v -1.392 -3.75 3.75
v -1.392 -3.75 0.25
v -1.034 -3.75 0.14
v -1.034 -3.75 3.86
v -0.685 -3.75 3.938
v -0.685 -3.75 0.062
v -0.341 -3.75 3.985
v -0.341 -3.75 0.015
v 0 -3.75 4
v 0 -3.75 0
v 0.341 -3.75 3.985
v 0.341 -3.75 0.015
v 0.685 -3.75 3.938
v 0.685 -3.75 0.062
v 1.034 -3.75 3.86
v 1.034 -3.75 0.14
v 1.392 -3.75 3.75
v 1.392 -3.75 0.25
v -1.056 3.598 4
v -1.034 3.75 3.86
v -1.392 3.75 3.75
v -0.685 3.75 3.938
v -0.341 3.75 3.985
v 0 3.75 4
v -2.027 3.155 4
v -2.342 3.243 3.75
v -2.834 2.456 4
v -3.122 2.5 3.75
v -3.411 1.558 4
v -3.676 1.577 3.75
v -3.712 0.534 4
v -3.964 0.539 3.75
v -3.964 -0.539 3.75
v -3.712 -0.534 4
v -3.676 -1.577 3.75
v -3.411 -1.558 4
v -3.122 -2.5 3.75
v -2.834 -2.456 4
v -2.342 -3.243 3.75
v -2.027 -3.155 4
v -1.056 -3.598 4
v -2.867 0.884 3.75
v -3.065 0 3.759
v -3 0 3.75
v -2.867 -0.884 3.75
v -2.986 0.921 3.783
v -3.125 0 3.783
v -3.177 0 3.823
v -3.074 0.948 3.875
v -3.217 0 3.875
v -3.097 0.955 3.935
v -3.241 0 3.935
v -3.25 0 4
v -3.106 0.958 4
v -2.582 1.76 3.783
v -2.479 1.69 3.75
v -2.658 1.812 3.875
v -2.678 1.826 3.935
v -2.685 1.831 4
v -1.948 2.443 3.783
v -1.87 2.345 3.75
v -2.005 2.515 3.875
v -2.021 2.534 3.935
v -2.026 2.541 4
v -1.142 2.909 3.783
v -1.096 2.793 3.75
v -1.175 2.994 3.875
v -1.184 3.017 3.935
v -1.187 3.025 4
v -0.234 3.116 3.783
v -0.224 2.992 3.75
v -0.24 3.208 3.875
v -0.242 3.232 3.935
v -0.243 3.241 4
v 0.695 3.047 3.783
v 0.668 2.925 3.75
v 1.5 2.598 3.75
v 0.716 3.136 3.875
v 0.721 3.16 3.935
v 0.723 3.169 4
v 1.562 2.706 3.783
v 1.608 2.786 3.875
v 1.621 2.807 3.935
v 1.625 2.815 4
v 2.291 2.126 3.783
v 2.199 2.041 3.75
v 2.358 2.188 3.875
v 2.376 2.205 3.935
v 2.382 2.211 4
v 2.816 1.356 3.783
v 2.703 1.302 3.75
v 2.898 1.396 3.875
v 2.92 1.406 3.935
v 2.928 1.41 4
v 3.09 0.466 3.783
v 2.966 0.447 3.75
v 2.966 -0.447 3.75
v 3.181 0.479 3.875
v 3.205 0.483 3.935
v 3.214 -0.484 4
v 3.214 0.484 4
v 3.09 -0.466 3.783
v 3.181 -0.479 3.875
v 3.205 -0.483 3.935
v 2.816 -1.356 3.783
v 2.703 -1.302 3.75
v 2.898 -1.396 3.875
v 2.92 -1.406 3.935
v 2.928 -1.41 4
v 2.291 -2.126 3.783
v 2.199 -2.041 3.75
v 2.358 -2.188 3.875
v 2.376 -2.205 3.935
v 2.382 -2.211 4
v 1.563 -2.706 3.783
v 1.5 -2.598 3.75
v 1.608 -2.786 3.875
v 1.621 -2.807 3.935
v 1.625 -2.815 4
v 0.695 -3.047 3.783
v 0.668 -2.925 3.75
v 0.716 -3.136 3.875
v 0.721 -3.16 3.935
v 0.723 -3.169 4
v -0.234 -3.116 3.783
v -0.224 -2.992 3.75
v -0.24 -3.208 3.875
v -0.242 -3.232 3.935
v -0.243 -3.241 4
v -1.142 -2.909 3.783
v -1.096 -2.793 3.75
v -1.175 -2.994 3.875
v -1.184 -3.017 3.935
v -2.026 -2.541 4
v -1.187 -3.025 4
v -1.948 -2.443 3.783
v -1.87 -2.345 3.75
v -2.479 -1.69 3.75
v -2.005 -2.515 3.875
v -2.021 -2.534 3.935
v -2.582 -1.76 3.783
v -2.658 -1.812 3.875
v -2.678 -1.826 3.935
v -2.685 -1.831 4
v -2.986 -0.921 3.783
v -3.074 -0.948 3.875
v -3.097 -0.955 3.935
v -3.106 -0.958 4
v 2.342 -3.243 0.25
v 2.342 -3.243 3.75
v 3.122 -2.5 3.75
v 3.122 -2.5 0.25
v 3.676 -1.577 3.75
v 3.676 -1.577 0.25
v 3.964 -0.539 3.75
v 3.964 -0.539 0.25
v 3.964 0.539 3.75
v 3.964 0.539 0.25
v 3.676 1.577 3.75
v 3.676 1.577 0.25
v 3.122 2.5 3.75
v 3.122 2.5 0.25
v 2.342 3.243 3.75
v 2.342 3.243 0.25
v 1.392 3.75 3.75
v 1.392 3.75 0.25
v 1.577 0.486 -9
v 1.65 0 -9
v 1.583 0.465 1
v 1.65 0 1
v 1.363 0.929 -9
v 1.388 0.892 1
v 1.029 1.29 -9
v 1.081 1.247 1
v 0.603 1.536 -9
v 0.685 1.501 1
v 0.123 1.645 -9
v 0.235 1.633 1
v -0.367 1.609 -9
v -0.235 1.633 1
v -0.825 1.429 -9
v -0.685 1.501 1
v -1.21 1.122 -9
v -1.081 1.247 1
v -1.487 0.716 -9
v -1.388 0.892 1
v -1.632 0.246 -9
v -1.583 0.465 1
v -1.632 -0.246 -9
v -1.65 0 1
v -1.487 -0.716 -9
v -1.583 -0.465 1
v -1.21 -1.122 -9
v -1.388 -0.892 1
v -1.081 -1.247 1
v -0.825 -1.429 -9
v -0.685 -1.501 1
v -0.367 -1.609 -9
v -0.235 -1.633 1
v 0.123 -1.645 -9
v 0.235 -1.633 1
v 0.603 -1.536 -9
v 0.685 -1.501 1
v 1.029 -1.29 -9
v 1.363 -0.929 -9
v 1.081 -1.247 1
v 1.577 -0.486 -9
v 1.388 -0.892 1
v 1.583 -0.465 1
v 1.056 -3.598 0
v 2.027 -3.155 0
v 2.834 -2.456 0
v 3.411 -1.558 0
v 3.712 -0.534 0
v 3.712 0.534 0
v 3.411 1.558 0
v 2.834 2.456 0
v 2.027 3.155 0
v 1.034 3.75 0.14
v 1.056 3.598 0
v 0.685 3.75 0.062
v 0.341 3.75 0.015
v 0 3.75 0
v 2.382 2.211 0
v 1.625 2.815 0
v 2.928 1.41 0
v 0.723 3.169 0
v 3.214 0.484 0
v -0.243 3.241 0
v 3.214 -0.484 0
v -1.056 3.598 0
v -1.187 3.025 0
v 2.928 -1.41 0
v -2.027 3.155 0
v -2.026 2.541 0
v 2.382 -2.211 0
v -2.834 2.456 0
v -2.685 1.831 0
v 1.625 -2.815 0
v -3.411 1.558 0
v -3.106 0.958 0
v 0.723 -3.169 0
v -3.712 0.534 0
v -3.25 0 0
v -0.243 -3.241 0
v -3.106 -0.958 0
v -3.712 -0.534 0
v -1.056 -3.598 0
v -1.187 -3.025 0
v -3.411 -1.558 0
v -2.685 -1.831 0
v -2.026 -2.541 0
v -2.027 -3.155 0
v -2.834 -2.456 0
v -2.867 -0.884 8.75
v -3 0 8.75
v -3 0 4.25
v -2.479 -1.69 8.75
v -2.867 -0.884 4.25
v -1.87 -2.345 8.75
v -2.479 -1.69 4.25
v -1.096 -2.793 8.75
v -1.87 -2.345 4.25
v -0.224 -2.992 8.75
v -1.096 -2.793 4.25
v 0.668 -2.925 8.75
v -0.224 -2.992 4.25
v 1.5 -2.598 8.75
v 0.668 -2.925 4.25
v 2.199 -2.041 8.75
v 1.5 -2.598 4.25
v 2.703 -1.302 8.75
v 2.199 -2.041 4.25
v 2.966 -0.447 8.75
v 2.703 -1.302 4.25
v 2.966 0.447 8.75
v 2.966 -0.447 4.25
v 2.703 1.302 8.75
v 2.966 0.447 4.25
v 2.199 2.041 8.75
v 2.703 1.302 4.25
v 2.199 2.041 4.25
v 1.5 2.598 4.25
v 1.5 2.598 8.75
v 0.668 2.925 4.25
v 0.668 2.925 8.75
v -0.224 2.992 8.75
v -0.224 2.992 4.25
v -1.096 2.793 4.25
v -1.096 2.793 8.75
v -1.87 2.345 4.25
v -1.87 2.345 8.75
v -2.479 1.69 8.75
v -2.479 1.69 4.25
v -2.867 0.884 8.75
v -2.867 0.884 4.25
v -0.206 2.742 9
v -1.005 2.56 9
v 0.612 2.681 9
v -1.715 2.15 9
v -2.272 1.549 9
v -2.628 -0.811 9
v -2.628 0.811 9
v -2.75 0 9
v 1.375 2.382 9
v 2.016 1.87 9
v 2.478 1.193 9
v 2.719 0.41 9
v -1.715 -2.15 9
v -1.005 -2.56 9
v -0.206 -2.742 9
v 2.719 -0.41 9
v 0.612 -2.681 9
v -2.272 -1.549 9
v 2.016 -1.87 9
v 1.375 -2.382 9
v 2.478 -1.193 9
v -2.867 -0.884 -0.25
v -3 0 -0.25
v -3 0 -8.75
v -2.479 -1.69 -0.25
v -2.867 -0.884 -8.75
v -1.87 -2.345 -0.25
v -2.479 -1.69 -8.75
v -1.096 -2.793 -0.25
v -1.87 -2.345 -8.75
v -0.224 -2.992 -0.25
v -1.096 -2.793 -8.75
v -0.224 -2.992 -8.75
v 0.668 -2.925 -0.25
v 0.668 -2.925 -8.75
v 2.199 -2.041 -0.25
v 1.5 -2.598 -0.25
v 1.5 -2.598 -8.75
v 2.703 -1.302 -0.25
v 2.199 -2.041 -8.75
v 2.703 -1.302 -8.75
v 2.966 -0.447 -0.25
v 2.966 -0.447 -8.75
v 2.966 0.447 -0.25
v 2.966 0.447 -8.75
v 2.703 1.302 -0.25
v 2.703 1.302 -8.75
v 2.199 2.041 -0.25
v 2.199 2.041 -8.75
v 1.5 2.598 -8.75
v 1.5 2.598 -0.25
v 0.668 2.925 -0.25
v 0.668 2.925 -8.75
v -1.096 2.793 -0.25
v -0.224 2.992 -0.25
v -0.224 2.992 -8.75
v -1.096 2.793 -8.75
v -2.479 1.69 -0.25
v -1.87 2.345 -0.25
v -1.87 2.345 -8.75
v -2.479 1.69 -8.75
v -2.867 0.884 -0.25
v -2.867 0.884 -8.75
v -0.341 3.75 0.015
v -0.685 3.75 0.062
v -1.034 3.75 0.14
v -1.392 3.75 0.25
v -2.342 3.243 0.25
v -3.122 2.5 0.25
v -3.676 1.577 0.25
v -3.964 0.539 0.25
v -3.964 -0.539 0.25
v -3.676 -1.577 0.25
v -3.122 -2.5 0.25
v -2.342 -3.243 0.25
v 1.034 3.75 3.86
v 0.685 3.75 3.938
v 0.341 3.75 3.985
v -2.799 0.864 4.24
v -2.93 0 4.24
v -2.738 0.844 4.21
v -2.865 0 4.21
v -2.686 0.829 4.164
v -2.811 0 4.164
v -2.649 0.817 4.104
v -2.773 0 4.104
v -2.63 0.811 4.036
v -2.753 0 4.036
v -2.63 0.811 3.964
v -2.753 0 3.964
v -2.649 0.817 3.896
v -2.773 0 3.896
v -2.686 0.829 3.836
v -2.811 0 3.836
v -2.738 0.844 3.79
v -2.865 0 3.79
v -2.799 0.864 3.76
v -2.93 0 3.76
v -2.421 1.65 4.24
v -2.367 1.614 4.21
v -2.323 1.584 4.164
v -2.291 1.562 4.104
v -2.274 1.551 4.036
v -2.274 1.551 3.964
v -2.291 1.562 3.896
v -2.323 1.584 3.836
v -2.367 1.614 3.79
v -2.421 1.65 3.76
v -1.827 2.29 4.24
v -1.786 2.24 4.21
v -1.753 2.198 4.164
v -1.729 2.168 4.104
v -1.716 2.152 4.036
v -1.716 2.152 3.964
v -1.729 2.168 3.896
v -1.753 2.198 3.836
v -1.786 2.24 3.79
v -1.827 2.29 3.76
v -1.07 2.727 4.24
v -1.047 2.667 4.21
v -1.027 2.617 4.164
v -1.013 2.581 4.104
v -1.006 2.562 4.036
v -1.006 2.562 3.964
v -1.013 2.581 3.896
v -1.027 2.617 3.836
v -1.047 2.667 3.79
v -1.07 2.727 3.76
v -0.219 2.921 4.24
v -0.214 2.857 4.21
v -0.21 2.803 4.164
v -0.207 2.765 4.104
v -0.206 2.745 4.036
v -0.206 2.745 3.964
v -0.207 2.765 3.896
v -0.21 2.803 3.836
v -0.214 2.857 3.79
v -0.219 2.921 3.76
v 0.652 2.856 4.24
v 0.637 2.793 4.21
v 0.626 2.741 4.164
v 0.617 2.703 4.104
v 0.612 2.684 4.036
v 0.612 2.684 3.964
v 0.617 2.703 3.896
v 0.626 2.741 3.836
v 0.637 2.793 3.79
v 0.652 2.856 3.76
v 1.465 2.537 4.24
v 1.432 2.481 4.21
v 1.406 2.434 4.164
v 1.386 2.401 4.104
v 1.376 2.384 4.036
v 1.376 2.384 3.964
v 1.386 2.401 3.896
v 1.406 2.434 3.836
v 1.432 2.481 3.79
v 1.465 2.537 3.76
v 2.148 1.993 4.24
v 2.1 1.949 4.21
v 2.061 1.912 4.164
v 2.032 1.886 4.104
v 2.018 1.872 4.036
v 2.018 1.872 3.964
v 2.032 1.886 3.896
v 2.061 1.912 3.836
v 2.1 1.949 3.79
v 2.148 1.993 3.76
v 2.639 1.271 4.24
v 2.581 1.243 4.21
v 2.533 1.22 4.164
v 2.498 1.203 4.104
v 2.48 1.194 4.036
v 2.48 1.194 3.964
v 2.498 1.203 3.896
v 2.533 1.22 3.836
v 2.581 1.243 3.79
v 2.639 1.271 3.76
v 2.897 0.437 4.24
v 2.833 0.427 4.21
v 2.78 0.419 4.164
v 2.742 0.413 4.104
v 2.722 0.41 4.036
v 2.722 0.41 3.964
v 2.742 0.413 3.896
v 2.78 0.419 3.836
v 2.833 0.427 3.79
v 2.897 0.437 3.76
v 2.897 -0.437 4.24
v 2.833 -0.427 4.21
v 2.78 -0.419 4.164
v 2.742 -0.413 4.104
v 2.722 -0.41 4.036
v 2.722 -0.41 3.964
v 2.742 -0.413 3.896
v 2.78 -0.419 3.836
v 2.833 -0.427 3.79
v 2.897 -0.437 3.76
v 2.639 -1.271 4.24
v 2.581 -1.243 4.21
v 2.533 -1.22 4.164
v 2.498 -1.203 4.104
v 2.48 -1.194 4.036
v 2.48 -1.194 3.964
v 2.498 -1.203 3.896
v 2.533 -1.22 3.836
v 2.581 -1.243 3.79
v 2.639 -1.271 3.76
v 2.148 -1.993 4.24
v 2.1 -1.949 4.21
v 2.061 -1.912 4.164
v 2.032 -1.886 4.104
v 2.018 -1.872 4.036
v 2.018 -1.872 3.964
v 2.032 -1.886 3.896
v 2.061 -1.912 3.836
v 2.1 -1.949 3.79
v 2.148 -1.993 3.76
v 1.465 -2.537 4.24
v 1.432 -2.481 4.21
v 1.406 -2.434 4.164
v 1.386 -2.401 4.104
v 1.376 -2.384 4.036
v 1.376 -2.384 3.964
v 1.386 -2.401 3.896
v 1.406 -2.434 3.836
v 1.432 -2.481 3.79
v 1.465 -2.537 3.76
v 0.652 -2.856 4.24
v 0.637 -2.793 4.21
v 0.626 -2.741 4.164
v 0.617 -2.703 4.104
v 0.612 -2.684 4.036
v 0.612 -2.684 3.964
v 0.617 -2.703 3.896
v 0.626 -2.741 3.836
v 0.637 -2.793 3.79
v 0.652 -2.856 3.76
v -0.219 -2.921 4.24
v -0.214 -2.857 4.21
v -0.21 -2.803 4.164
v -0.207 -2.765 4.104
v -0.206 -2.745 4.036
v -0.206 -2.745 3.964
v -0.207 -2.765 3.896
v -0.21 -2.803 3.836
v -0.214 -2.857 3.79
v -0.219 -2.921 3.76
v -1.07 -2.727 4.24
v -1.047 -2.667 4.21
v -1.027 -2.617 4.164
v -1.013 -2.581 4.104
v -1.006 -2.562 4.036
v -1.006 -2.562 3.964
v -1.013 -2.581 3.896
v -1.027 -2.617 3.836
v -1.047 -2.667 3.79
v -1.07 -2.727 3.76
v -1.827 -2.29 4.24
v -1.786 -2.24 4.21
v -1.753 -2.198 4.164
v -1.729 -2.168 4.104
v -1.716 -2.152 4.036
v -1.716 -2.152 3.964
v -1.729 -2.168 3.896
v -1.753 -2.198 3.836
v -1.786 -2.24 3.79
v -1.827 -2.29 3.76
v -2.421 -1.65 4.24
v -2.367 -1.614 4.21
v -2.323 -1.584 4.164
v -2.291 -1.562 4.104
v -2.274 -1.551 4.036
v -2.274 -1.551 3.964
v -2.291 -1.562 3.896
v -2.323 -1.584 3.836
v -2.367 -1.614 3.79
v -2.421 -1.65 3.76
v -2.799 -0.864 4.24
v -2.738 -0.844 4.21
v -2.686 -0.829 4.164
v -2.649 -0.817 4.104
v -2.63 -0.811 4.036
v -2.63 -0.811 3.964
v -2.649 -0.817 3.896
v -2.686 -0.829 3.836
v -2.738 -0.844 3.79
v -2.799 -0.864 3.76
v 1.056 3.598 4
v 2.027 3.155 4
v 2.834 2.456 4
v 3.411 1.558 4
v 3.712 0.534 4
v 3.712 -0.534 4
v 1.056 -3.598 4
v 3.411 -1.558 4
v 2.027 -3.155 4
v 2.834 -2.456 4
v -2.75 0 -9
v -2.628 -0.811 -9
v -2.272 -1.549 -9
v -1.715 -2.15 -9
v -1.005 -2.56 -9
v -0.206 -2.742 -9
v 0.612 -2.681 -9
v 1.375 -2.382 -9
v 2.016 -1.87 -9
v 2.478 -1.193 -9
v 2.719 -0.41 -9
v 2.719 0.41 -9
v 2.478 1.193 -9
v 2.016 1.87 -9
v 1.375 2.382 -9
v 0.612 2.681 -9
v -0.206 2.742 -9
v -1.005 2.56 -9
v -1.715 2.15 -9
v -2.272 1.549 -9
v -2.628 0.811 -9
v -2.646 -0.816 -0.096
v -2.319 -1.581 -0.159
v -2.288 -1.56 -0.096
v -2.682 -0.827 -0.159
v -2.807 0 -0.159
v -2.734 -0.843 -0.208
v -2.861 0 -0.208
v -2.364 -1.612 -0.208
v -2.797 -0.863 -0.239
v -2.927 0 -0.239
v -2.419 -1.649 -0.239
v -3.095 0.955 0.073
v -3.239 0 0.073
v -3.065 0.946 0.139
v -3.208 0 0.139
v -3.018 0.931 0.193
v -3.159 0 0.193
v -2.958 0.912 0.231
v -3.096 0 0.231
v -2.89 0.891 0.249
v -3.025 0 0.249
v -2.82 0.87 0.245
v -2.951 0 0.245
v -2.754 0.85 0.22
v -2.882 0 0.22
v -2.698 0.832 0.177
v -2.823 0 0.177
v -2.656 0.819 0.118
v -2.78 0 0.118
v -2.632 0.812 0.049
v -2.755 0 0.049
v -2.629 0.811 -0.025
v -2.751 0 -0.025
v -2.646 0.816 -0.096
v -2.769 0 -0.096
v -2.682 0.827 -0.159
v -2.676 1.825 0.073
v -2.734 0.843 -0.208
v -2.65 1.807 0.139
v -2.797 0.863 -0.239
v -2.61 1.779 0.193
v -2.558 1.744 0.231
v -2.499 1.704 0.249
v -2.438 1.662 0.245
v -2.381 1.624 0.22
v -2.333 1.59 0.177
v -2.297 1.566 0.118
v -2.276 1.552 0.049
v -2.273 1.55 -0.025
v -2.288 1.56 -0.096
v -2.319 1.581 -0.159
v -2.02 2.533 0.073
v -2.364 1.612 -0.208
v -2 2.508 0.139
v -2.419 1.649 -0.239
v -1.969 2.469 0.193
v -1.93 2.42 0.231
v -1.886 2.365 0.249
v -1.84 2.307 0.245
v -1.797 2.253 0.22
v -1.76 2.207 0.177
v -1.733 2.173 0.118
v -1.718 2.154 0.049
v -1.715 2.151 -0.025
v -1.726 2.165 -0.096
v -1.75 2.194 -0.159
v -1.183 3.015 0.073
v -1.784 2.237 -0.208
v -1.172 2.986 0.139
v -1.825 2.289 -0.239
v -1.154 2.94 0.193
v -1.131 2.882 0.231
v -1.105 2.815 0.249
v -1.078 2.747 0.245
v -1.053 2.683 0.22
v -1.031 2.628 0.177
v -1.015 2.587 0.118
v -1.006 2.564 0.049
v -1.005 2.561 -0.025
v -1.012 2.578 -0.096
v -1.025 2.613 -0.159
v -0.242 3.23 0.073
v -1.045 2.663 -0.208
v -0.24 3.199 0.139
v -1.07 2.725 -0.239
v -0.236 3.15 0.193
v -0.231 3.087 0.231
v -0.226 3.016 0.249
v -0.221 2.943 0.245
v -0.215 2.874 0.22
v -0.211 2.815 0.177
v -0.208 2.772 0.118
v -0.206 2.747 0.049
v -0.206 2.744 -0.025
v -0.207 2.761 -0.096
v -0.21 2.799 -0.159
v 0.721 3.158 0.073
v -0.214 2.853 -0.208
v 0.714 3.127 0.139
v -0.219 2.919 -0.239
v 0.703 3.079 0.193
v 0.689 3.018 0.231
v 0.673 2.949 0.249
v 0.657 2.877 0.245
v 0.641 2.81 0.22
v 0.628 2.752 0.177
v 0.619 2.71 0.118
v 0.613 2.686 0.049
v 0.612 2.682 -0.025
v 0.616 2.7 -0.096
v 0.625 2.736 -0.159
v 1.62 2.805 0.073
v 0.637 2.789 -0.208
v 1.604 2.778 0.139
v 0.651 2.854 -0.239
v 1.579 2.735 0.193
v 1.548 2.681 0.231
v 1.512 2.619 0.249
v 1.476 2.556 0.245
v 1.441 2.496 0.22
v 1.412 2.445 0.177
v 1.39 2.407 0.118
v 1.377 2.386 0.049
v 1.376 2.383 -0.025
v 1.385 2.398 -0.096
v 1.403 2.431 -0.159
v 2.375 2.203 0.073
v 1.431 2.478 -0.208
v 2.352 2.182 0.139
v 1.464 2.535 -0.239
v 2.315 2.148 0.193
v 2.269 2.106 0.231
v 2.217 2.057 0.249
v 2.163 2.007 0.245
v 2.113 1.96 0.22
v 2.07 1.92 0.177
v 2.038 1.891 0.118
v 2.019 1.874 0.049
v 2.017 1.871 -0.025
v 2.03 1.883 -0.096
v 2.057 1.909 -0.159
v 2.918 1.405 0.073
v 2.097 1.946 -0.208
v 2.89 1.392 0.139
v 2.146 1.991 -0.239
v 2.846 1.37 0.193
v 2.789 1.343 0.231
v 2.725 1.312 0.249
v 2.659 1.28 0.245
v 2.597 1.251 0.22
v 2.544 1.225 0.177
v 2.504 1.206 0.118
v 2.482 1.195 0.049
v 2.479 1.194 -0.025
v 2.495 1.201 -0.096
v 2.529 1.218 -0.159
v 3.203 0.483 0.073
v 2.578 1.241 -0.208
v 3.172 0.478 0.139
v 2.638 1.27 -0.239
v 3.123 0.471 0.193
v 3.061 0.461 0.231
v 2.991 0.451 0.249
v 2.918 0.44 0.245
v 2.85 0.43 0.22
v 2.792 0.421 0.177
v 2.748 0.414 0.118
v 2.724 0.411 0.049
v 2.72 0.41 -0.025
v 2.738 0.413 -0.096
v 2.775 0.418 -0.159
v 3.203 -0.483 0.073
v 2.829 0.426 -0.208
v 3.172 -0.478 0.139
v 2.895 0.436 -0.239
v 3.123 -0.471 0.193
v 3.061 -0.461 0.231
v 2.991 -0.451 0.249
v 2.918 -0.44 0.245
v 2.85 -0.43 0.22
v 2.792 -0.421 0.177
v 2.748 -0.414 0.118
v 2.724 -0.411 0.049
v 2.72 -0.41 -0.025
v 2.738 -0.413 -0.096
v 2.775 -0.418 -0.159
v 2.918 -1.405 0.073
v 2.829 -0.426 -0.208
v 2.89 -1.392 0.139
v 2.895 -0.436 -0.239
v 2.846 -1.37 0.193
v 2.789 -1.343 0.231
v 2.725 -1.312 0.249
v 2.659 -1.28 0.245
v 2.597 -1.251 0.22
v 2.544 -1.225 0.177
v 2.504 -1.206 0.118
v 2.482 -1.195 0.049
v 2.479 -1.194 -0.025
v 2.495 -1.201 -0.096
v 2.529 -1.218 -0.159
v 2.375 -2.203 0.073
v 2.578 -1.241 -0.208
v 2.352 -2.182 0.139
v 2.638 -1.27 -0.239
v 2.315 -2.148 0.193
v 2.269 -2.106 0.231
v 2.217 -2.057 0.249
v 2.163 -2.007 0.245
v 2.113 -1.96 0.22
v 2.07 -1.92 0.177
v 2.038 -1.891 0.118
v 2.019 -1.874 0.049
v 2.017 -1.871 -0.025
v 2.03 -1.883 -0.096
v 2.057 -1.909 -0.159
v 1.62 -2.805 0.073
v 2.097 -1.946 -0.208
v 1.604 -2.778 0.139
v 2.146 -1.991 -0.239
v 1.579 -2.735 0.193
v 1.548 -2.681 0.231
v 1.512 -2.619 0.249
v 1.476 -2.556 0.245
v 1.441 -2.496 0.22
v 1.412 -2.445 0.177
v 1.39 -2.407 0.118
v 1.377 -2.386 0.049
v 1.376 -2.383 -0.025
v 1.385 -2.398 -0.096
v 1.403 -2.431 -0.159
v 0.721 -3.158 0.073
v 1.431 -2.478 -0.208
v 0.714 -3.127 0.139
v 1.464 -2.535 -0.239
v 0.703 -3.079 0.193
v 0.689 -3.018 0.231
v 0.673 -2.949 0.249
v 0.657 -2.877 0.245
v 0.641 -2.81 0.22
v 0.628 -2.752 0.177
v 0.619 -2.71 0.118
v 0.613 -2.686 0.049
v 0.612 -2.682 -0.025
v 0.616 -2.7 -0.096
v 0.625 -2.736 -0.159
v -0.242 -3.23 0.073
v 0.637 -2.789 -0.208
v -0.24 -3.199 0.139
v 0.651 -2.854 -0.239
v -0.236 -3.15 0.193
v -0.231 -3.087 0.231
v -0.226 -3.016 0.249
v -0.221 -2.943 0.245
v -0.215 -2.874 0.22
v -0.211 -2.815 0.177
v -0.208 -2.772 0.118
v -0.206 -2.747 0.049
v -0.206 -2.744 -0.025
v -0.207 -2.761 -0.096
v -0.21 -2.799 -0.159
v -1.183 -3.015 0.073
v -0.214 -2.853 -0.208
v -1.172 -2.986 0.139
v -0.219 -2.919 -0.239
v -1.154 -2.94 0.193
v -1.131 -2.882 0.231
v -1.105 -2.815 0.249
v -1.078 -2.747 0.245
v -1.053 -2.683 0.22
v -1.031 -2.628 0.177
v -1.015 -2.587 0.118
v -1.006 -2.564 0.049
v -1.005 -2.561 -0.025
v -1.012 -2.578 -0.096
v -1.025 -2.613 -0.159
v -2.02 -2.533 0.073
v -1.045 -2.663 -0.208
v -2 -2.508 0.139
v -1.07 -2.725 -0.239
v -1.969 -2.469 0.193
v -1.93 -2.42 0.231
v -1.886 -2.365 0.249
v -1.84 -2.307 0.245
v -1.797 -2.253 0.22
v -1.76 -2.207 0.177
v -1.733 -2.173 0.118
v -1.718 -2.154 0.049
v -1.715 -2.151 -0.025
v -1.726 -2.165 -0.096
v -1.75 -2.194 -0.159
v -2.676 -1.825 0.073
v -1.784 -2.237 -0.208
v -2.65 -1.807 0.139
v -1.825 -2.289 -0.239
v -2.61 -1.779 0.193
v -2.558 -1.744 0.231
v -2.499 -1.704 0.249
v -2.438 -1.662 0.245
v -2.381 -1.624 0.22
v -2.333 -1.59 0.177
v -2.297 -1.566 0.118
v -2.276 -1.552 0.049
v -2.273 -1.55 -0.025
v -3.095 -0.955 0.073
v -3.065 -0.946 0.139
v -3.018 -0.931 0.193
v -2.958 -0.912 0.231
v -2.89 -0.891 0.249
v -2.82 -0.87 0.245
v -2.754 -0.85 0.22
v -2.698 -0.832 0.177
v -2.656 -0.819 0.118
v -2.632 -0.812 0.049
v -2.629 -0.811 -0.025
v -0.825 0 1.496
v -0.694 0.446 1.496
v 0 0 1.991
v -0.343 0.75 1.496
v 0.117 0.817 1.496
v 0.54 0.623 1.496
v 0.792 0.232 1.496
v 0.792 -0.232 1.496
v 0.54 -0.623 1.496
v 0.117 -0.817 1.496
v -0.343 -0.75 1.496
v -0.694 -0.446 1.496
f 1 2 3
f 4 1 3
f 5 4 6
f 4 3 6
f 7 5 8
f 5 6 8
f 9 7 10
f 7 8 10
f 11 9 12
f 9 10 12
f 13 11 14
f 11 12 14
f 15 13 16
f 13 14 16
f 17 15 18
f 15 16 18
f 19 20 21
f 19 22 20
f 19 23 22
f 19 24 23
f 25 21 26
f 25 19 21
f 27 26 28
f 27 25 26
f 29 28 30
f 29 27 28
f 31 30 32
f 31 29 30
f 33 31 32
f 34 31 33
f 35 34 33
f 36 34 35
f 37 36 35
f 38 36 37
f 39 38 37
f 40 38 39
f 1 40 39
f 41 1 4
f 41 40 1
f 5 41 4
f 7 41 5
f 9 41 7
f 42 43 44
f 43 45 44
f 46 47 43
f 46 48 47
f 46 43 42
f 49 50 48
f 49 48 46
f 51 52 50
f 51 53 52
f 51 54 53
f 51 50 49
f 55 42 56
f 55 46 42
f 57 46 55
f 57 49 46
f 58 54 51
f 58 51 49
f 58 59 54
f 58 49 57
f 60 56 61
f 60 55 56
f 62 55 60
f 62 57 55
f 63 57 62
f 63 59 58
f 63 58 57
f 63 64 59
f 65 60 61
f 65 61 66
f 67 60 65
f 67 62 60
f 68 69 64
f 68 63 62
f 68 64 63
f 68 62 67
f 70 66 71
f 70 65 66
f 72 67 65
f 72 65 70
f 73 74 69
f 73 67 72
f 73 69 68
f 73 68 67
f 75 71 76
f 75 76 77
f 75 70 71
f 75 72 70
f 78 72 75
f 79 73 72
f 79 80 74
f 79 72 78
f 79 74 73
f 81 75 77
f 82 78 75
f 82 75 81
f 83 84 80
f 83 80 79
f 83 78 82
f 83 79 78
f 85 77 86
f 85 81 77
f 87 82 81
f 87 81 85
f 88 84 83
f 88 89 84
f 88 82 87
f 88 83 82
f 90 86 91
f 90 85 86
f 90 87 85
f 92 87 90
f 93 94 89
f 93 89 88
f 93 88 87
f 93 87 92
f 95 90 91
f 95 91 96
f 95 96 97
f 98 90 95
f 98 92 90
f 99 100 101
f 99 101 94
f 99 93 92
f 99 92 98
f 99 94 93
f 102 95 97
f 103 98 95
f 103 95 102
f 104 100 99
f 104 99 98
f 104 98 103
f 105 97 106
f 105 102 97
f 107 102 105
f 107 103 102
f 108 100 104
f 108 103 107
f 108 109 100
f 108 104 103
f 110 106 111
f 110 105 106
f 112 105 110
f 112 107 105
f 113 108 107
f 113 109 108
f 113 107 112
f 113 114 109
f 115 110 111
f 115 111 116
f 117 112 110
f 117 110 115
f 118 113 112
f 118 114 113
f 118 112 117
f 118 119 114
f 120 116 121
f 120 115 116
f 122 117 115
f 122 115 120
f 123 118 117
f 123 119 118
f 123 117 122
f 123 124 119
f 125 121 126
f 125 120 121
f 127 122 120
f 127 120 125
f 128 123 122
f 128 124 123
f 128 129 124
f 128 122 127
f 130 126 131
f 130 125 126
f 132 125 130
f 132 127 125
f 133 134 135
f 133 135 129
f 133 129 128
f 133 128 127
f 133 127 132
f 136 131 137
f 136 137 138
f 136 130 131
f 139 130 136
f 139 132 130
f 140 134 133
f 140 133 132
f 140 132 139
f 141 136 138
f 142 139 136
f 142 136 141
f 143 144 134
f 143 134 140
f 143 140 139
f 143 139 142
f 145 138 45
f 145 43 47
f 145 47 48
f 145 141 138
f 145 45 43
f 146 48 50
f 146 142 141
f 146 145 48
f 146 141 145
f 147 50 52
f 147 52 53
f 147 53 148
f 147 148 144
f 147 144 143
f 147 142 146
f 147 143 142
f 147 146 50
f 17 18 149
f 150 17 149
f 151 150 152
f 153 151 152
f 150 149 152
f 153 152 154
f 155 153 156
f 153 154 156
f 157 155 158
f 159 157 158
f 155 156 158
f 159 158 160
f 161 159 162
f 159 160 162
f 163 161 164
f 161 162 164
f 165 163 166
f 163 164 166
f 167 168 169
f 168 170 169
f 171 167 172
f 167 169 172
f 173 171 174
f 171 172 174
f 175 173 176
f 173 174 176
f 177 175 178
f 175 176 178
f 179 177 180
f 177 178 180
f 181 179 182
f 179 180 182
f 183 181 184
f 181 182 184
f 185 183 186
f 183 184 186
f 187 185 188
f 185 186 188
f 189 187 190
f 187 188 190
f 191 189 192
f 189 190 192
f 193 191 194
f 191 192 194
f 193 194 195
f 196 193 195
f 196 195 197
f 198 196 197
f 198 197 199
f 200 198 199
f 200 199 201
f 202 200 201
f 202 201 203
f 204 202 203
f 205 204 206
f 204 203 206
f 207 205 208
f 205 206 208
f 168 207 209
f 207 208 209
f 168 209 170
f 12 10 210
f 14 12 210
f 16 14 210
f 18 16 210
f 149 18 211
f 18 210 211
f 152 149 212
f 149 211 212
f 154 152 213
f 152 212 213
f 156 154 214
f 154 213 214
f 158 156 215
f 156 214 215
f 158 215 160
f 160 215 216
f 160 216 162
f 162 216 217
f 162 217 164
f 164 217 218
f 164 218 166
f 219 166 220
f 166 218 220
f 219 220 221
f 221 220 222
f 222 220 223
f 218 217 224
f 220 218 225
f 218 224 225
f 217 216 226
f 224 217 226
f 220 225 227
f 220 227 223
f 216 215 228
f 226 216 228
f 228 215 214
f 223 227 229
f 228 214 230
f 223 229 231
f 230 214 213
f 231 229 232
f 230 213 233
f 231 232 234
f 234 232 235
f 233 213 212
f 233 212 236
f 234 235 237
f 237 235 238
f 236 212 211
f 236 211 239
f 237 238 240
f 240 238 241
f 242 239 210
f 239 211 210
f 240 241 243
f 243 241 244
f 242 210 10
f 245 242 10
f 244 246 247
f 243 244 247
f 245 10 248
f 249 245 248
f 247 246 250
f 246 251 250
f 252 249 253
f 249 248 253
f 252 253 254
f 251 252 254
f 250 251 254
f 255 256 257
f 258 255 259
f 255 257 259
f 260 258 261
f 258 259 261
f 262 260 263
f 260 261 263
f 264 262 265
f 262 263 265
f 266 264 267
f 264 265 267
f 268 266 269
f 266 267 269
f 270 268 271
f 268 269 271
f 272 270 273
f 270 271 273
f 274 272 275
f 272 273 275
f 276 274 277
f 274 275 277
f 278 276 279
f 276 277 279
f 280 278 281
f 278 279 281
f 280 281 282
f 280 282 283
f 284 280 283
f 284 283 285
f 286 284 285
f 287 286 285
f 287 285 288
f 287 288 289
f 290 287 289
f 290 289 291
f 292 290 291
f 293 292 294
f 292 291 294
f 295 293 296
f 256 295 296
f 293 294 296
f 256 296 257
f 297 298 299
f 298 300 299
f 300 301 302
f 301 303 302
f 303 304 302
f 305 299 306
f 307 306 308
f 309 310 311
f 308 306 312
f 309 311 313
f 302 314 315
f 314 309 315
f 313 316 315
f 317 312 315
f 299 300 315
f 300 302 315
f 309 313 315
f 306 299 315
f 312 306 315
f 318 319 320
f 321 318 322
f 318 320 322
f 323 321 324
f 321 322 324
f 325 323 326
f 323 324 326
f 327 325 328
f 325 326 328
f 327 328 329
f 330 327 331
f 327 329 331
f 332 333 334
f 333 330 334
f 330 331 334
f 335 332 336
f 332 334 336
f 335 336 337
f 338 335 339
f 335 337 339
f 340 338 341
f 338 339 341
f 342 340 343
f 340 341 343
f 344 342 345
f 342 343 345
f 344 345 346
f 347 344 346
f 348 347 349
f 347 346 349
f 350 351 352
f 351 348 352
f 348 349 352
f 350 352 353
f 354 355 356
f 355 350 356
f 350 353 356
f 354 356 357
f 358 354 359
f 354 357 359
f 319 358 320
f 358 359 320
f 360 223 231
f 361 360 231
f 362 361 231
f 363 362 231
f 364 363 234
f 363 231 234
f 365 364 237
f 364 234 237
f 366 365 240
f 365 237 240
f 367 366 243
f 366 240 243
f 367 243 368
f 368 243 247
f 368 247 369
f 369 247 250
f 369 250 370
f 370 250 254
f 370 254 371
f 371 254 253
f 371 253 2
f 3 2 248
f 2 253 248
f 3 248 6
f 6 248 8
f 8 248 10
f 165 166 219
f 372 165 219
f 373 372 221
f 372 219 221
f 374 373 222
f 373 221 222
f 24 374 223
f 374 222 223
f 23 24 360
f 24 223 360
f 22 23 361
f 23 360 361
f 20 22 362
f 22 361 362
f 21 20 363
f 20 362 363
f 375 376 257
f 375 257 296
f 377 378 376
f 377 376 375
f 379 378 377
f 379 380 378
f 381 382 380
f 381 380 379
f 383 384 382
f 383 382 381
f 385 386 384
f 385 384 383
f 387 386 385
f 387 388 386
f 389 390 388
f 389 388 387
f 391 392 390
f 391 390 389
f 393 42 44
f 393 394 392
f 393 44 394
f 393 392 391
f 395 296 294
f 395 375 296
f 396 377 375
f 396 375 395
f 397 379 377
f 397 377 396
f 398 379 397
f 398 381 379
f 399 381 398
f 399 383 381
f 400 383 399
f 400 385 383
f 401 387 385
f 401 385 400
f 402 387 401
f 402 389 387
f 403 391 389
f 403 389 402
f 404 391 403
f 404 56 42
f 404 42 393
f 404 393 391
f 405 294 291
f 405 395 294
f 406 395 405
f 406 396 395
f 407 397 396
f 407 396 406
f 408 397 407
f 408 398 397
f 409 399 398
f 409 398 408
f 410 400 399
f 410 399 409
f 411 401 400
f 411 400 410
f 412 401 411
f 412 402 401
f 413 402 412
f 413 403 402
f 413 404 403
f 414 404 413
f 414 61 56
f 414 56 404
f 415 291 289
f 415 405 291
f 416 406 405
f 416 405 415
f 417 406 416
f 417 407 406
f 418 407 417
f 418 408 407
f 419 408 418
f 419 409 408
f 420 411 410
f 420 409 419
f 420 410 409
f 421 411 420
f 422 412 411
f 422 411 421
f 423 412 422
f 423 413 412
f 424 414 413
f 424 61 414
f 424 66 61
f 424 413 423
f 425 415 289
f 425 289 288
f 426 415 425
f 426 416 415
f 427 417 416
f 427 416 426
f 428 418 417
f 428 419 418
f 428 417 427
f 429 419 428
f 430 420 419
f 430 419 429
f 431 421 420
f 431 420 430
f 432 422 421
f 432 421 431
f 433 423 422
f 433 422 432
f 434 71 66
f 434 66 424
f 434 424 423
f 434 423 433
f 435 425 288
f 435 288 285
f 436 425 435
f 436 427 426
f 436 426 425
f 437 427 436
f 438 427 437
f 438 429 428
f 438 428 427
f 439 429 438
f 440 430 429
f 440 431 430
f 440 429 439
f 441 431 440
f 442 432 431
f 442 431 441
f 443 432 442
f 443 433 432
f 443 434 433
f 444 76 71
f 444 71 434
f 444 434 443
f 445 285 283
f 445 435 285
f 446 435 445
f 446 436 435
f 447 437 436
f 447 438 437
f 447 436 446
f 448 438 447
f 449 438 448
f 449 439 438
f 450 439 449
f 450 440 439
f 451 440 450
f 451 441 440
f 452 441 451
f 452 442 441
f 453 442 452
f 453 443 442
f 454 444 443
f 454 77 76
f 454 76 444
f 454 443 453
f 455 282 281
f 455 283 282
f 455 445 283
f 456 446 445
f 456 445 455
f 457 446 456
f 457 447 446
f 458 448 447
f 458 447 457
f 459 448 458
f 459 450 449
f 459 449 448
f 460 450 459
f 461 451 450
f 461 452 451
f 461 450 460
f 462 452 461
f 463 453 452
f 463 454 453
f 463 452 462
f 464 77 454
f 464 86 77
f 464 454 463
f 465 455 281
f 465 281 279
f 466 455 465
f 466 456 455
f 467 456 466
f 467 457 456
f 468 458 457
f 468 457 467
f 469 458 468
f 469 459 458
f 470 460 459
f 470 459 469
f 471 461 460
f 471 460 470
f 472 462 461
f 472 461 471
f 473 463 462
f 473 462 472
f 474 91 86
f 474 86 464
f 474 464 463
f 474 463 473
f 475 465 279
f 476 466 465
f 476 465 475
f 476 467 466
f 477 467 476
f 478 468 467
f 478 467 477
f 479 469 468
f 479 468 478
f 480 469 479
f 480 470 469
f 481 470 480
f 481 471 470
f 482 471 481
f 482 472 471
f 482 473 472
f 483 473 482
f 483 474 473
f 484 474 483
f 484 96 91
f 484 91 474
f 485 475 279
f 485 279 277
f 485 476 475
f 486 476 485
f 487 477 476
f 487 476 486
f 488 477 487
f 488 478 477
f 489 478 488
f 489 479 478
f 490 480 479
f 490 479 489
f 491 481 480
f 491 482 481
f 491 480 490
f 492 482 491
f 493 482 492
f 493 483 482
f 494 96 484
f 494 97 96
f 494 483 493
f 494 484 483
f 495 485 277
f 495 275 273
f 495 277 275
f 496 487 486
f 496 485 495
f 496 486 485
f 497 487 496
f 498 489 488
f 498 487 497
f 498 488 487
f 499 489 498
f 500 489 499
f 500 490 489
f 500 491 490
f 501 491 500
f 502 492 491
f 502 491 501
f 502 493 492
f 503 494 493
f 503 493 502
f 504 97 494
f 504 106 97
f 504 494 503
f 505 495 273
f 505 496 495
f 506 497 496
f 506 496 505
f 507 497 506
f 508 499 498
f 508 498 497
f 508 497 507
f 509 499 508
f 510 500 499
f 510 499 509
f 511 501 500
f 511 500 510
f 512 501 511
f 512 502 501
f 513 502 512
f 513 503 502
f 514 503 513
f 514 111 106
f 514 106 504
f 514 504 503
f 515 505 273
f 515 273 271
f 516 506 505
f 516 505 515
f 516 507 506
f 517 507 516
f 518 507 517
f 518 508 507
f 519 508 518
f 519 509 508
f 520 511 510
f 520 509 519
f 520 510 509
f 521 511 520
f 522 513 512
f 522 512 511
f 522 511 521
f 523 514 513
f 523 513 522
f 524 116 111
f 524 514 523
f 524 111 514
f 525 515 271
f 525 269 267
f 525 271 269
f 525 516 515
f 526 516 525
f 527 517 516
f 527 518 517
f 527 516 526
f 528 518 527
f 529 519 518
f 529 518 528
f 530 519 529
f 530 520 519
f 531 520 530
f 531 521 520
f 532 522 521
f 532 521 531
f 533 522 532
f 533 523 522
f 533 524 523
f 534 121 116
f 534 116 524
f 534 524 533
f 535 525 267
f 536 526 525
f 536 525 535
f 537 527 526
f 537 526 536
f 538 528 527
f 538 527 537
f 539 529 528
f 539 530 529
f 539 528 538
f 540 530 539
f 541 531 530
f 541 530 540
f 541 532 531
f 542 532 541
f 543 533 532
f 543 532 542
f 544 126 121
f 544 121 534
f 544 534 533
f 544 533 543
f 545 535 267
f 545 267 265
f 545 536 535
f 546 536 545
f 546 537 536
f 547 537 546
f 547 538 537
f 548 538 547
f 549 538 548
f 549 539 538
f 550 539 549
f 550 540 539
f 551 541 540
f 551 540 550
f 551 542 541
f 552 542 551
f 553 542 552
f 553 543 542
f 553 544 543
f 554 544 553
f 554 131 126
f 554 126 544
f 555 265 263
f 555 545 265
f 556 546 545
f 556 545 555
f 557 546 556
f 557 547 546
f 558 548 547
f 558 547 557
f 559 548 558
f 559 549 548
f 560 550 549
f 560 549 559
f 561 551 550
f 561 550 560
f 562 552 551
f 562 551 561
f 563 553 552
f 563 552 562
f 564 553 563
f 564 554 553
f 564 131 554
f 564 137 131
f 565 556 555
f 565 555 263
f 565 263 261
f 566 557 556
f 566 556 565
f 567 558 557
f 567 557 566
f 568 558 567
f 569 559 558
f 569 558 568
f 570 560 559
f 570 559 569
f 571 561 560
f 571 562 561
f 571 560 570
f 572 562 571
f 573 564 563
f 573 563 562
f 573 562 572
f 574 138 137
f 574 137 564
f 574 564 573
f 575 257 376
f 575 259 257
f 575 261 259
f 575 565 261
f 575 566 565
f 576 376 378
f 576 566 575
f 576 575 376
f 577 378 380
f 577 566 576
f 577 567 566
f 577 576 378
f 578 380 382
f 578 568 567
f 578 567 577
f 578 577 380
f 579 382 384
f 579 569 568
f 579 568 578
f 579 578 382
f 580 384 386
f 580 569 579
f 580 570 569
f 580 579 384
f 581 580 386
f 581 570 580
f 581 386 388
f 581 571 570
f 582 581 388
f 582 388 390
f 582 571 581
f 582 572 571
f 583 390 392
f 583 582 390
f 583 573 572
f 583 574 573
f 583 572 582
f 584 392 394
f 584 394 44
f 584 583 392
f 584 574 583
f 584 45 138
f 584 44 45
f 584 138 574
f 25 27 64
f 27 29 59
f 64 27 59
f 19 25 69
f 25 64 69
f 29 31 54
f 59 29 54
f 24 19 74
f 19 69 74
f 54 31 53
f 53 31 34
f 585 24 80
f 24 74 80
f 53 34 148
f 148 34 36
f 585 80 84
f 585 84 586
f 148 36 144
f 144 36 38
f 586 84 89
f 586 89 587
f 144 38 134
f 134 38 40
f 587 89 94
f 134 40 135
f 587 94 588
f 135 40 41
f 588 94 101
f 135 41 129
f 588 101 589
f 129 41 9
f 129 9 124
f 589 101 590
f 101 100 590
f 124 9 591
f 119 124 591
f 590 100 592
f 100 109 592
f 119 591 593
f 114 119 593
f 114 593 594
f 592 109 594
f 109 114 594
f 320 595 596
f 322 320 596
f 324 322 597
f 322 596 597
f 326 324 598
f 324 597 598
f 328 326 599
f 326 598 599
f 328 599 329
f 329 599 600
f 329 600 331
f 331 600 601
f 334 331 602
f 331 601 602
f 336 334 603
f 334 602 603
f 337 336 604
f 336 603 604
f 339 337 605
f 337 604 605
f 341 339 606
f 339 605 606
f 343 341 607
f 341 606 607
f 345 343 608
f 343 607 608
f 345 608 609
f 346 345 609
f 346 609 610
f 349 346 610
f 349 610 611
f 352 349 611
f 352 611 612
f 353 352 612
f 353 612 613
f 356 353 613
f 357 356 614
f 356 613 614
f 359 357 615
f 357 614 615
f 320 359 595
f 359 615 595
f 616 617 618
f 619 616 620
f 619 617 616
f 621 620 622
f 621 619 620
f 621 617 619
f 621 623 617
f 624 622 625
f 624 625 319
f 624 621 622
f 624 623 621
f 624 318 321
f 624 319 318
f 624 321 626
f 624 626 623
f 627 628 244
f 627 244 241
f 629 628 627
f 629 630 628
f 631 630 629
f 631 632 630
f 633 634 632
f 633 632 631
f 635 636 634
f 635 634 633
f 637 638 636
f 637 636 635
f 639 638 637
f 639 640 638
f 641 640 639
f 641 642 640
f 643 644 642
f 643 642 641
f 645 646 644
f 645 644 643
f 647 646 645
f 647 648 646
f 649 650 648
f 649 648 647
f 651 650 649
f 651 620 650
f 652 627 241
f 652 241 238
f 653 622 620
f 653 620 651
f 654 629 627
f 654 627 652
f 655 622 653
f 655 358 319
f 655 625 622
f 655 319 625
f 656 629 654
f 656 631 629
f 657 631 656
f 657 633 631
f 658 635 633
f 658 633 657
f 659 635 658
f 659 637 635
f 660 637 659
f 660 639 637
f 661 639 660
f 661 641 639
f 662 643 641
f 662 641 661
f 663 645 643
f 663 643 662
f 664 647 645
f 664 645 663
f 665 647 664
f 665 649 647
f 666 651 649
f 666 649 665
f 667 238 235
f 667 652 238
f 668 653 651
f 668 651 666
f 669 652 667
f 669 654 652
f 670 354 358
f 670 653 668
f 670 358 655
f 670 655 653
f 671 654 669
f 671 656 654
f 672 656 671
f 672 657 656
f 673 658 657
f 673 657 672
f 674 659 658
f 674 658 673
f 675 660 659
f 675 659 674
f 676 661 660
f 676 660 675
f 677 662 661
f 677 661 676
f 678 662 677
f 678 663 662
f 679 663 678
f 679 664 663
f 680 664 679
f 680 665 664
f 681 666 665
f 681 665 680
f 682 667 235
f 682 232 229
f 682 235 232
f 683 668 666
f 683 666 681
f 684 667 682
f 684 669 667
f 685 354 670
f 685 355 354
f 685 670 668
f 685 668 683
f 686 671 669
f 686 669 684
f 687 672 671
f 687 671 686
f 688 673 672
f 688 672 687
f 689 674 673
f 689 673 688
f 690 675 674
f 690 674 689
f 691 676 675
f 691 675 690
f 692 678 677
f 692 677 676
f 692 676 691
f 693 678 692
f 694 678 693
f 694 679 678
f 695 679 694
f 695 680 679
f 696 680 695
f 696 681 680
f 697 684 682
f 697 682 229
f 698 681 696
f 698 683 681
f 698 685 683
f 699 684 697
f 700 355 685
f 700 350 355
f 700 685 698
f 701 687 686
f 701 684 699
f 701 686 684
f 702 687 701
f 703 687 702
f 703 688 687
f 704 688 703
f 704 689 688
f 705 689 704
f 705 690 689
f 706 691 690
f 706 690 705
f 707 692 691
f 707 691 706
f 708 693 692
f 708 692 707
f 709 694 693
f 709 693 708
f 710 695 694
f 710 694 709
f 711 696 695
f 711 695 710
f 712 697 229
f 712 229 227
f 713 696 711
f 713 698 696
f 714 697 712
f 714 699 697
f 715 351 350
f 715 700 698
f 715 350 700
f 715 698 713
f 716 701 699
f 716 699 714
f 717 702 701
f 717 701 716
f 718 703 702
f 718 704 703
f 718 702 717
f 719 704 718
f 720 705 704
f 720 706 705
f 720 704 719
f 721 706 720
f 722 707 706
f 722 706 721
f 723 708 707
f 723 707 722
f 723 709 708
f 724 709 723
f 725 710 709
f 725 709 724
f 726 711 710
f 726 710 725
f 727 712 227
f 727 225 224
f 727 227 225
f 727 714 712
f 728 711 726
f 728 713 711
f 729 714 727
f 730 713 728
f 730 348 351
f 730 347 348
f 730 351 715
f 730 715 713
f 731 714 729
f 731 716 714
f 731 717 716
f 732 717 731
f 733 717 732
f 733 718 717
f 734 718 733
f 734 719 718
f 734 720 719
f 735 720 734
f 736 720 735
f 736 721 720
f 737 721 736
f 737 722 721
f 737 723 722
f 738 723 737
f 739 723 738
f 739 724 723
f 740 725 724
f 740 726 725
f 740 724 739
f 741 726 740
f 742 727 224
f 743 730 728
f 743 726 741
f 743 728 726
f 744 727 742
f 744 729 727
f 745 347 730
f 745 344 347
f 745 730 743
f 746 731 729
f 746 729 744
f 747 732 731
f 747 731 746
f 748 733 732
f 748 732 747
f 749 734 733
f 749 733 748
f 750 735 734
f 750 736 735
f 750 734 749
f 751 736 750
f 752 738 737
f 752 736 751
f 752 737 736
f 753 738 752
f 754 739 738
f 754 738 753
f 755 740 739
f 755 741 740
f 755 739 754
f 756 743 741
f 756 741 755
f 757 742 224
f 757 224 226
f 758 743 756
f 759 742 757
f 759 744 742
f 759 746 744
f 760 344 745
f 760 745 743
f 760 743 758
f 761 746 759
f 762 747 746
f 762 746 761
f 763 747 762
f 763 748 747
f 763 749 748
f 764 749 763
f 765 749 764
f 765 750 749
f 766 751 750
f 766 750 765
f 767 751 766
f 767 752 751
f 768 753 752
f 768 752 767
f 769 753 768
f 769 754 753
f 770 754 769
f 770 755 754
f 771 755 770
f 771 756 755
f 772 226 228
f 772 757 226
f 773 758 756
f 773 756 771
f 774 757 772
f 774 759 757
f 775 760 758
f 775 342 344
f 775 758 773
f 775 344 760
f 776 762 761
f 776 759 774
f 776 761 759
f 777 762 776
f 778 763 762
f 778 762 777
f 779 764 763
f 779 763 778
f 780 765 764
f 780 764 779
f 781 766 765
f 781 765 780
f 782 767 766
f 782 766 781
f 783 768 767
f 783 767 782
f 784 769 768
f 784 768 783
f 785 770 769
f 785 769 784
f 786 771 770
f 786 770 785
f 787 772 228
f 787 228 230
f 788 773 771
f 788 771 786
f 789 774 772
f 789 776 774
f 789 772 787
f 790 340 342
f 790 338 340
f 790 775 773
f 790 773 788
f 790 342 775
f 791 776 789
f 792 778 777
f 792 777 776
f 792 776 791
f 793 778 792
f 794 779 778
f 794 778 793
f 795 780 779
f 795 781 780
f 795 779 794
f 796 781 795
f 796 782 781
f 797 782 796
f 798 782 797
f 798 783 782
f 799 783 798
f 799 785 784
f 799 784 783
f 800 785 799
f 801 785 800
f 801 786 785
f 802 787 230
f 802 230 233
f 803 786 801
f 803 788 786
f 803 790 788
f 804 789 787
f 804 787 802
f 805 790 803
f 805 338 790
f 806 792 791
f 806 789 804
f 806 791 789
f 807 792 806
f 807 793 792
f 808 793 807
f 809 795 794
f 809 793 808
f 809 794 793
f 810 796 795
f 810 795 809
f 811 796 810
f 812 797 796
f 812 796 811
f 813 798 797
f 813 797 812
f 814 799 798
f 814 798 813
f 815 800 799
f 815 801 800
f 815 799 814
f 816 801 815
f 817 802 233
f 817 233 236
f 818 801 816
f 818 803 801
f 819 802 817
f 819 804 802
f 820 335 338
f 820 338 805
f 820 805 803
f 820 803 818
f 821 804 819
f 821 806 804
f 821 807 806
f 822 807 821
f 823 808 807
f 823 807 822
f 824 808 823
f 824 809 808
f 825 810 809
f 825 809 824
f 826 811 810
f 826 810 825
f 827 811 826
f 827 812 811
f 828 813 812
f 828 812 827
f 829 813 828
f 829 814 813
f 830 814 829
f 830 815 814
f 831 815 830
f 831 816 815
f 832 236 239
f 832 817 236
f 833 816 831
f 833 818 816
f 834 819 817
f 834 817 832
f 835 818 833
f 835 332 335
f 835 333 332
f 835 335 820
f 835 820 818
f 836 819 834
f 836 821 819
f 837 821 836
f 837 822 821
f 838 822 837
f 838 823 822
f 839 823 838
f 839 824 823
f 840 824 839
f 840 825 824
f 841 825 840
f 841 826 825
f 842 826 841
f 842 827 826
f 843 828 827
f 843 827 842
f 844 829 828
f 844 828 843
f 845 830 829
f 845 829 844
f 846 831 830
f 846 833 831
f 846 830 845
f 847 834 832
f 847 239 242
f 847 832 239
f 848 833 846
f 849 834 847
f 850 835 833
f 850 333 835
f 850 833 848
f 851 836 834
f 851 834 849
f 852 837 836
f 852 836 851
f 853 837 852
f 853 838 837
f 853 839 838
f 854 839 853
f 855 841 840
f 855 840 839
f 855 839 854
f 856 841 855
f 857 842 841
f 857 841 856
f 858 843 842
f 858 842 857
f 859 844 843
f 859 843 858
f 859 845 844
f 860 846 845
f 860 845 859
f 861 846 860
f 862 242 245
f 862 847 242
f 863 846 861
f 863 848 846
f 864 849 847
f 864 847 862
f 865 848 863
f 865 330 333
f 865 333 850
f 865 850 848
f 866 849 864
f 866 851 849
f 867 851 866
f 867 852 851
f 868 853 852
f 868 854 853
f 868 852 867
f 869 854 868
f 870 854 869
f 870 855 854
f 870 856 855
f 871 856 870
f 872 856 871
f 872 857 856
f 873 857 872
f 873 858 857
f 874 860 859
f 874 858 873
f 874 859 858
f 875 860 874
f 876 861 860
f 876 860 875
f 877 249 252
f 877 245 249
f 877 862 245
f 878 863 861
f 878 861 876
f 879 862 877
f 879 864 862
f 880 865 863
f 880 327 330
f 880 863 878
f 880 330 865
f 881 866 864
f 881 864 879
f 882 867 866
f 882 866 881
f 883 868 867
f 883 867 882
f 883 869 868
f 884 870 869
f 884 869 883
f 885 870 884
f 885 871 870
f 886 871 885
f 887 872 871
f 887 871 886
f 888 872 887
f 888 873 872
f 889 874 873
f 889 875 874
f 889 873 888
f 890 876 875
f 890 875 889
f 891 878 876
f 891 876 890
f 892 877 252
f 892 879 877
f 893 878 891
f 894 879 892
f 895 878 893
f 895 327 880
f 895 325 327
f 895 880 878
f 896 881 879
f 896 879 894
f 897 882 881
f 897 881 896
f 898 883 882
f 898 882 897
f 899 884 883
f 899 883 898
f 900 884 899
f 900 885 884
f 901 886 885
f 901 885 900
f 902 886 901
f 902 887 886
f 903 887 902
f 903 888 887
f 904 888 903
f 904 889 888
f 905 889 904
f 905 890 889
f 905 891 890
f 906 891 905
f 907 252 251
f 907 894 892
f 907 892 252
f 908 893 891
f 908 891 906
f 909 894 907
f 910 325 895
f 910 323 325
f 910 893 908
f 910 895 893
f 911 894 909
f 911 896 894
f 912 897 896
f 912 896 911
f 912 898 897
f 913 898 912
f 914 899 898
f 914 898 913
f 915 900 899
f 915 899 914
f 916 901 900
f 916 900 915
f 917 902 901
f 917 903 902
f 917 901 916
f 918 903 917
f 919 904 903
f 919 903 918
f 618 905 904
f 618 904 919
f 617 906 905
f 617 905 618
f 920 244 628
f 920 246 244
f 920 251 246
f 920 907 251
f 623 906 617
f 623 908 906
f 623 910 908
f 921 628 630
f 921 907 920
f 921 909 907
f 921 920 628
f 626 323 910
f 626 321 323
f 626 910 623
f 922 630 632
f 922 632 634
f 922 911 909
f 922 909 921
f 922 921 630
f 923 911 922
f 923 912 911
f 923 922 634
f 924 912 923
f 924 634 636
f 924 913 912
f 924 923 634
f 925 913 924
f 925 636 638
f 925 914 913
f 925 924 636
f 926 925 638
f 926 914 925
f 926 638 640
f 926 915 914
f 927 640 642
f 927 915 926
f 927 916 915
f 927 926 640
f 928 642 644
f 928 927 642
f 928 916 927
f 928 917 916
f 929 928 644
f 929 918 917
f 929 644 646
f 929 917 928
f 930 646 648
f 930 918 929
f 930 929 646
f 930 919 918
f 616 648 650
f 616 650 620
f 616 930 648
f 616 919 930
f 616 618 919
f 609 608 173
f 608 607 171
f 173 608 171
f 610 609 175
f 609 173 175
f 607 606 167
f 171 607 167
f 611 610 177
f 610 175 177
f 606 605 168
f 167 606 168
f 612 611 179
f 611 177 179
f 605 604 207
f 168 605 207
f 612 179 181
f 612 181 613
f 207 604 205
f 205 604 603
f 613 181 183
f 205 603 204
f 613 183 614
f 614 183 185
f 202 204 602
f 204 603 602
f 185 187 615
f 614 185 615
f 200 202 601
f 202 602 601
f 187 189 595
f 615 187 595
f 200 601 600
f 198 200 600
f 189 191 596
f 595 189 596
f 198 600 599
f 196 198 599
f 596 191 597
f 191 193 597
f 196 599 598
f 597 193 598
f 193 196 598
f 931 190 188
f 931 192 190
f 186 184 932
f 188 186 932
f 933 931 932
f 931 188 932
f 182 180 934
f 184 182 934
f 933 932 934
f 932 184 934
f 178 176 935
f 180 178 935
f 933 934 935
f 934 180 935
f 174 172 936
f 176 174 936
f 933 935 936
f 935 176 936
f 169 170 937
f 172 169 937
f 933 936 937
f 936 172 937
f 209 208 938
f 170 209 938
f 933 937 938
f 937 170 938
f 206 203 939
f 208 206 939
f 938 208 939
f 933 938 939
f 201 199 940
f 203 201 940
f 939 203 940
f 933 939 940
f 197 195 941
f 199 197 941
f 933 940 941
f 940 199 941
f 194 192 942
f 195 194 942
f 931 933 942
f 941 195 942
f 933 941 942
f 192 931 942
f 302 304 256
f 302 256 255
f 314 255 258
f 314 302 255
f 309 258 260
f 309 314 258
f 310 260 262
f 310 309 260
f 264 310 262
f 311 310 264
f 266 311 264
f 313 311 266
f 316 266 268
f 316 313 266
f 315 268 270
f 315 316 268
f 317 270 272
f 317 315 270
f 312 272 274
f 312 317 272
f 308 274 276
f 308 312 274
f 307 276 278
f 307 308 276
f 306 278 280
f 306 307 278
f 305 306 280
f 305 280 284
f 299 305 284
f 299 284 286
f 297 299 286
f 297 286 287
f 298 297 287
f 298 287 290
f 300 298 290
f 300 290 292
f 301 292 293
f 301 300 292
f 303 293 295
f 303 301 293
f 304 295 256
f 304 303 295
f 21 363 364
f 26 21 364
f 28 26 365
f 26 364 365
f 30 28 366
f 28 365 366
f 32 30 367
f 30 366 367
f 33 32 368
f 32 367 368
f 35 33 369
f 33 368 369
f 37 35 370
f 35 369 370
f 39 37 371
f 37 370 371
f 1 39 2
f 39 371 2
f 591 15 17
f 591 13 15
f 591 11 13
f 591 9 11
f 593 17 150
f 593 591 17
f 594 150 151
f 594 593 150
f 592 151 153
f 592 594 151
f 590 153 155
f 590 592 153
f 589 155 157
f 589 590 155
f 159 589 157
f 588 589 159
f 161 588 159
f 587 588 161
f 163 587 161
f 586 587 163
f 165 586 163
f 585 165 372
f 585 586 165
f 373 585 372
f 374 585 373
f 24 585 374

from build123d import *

# Parameters (mm, degrees)
M4X0_7_TAPPED_HOLE1_D     = 3.3
M4X0_7_TAPPED_HOLE1_DEPTH = 10
M4X0_7_TAPPED_HOLE1_TIP   = 0.991420021
SKETCH5_R                 = 0.25
CHAMFER1_SIZE             = 0.25
CUT_EXTRUDE1_REACH        = 12.63


with BuildPart() as part:
    # Sketch1 → Revolve1 (revolve)
    with BuildSketch(Plane(origin=(0, 0, 0), x_dir=(0, 0, -1), z_dir=(1, 0, 0)), mode=Mode.PRIVATE) as revolve1_sk:
        Polygon((-4, 4), (0, 4), (0, 3), (9, 3), (9, 0), (-9, 0), (-9, 3), (-4, 3), align=None)
    revolve(revolve1_sk.sketch.rotate(Axis((0, 0, -9), (0, 0, 1)), 90), axis=Axis((0, 0, -9), (0, 0, 1)))

    # M4x0.7 Tapped Hole1
    with Locations(Plane(origin=(0, 0, -9), x_dir=(-1, 0, 0), z_dir=(0, 0, -1))):
        with Locations((0, 0)):
            Hole(M4X0_7_TAPPED_HOLE1_D / 2, depth=M4X0_7_TAPPED_HOLE1_DEPTH)
            with Locations((0, 0, -(M4X0_7_TAPPED_HOLE1_DEPTH + M4X0_7_TAPPED_HOLE1_TIP / 2))):  # 118° drill point
                Cone(0, M4X0_7_TAPPED_HOLE1_D / 2, M4X0_7_TAPPED_HOLE1_TIP, mode=Mode.SUBTRACT)

    # Sketch5 → Cut-Revolve1 (revolve, cut)
    with BuildSketch(Plane(origin=(0, 0, 0), x_dir=(0, 0, -1), z_dir=(1, 0, 0)), mode=Mode.PRIVATE) as cut_revolve1_sk:
        with Locations((-4, 3)):
            Circle(SKETCH5_R)
        with Locations((0, 3)):
            Circle(SKETCH5_R)
    revolve(cut_revolve1_sk.sketch.rotate(Axis((0, 0, 9), (0, 0, -1)), 270), axis=Axis((0, 0, 9), (0, 0, -1)), mode=Mode.SUBTRACT)

    # Chamfer1
    chamfer1_edges = [part.edges().sort_by_distance(p)[0] for p in [
        (3, 0, 9),
        (3, 0, -9),
        (4, 0, 0),
        (4, 0, 4),
    ]]
    chamfer(chamfer1_edges, length=CHAMFER1_SIZE)

    # Sketch6 → Cut-Extrude1 (cut, up to next)
    with BuildSketch(Plane(origin=(0, 0, 0), x_dir=(-1, 0, 0), z_dir=(0, 0, -1)), mode=Mode.PRIVATE) as cut_extrude1_sk1:
        with BuildLine():
            ThreePointArc((1.391941091, 3.75), (0, 4), (-1.391941091, 3.75))
            Line((-1.391941091, 3.75), (1.391941091, 3.75))
        make_face()
    cut_extrude1_tool1 = extrude(cut_extrude1_sk1.sketch, amount=-CUT_EXTRUDE1_REACH, mode=Mode.PRIVATE) & part.part
    # Sketch6 → Cut-Extrude1 (cut, up to next)
    with BuildSketch(Plane(origin=(0, 0, 0), x_dir=(-1, 0, 0), z_dir=(0, 0, -1)), mode=Mode.PRIVATE) as cut_extrude1_sk2:
        with BuildLine():
            Line((1.391941091, -3.75), (-1.391941091, -3.75))
            ThreePointArc((-1.391941091, -3.75), (0, -4), (1.391941091, -3.75))
        make_face()
    cut_extrude1_tool2 = extrude(cut_extrude1_sk2.sketch, amount=-CUT_EXTRUDE1_REACH, mode=Mode.PRIVATE) & part.part
    add(cut_extrude1_tool1.solids().sort_by_distance((0, 3.850273, 0))[0], mode=Mode.SUBTRACT)
    add(cut_extrude1_tool2.solids().sort_by_distance((0, -3.850273, 0))[0], mode=Mode.SUBTRACT)


solid = part.part
